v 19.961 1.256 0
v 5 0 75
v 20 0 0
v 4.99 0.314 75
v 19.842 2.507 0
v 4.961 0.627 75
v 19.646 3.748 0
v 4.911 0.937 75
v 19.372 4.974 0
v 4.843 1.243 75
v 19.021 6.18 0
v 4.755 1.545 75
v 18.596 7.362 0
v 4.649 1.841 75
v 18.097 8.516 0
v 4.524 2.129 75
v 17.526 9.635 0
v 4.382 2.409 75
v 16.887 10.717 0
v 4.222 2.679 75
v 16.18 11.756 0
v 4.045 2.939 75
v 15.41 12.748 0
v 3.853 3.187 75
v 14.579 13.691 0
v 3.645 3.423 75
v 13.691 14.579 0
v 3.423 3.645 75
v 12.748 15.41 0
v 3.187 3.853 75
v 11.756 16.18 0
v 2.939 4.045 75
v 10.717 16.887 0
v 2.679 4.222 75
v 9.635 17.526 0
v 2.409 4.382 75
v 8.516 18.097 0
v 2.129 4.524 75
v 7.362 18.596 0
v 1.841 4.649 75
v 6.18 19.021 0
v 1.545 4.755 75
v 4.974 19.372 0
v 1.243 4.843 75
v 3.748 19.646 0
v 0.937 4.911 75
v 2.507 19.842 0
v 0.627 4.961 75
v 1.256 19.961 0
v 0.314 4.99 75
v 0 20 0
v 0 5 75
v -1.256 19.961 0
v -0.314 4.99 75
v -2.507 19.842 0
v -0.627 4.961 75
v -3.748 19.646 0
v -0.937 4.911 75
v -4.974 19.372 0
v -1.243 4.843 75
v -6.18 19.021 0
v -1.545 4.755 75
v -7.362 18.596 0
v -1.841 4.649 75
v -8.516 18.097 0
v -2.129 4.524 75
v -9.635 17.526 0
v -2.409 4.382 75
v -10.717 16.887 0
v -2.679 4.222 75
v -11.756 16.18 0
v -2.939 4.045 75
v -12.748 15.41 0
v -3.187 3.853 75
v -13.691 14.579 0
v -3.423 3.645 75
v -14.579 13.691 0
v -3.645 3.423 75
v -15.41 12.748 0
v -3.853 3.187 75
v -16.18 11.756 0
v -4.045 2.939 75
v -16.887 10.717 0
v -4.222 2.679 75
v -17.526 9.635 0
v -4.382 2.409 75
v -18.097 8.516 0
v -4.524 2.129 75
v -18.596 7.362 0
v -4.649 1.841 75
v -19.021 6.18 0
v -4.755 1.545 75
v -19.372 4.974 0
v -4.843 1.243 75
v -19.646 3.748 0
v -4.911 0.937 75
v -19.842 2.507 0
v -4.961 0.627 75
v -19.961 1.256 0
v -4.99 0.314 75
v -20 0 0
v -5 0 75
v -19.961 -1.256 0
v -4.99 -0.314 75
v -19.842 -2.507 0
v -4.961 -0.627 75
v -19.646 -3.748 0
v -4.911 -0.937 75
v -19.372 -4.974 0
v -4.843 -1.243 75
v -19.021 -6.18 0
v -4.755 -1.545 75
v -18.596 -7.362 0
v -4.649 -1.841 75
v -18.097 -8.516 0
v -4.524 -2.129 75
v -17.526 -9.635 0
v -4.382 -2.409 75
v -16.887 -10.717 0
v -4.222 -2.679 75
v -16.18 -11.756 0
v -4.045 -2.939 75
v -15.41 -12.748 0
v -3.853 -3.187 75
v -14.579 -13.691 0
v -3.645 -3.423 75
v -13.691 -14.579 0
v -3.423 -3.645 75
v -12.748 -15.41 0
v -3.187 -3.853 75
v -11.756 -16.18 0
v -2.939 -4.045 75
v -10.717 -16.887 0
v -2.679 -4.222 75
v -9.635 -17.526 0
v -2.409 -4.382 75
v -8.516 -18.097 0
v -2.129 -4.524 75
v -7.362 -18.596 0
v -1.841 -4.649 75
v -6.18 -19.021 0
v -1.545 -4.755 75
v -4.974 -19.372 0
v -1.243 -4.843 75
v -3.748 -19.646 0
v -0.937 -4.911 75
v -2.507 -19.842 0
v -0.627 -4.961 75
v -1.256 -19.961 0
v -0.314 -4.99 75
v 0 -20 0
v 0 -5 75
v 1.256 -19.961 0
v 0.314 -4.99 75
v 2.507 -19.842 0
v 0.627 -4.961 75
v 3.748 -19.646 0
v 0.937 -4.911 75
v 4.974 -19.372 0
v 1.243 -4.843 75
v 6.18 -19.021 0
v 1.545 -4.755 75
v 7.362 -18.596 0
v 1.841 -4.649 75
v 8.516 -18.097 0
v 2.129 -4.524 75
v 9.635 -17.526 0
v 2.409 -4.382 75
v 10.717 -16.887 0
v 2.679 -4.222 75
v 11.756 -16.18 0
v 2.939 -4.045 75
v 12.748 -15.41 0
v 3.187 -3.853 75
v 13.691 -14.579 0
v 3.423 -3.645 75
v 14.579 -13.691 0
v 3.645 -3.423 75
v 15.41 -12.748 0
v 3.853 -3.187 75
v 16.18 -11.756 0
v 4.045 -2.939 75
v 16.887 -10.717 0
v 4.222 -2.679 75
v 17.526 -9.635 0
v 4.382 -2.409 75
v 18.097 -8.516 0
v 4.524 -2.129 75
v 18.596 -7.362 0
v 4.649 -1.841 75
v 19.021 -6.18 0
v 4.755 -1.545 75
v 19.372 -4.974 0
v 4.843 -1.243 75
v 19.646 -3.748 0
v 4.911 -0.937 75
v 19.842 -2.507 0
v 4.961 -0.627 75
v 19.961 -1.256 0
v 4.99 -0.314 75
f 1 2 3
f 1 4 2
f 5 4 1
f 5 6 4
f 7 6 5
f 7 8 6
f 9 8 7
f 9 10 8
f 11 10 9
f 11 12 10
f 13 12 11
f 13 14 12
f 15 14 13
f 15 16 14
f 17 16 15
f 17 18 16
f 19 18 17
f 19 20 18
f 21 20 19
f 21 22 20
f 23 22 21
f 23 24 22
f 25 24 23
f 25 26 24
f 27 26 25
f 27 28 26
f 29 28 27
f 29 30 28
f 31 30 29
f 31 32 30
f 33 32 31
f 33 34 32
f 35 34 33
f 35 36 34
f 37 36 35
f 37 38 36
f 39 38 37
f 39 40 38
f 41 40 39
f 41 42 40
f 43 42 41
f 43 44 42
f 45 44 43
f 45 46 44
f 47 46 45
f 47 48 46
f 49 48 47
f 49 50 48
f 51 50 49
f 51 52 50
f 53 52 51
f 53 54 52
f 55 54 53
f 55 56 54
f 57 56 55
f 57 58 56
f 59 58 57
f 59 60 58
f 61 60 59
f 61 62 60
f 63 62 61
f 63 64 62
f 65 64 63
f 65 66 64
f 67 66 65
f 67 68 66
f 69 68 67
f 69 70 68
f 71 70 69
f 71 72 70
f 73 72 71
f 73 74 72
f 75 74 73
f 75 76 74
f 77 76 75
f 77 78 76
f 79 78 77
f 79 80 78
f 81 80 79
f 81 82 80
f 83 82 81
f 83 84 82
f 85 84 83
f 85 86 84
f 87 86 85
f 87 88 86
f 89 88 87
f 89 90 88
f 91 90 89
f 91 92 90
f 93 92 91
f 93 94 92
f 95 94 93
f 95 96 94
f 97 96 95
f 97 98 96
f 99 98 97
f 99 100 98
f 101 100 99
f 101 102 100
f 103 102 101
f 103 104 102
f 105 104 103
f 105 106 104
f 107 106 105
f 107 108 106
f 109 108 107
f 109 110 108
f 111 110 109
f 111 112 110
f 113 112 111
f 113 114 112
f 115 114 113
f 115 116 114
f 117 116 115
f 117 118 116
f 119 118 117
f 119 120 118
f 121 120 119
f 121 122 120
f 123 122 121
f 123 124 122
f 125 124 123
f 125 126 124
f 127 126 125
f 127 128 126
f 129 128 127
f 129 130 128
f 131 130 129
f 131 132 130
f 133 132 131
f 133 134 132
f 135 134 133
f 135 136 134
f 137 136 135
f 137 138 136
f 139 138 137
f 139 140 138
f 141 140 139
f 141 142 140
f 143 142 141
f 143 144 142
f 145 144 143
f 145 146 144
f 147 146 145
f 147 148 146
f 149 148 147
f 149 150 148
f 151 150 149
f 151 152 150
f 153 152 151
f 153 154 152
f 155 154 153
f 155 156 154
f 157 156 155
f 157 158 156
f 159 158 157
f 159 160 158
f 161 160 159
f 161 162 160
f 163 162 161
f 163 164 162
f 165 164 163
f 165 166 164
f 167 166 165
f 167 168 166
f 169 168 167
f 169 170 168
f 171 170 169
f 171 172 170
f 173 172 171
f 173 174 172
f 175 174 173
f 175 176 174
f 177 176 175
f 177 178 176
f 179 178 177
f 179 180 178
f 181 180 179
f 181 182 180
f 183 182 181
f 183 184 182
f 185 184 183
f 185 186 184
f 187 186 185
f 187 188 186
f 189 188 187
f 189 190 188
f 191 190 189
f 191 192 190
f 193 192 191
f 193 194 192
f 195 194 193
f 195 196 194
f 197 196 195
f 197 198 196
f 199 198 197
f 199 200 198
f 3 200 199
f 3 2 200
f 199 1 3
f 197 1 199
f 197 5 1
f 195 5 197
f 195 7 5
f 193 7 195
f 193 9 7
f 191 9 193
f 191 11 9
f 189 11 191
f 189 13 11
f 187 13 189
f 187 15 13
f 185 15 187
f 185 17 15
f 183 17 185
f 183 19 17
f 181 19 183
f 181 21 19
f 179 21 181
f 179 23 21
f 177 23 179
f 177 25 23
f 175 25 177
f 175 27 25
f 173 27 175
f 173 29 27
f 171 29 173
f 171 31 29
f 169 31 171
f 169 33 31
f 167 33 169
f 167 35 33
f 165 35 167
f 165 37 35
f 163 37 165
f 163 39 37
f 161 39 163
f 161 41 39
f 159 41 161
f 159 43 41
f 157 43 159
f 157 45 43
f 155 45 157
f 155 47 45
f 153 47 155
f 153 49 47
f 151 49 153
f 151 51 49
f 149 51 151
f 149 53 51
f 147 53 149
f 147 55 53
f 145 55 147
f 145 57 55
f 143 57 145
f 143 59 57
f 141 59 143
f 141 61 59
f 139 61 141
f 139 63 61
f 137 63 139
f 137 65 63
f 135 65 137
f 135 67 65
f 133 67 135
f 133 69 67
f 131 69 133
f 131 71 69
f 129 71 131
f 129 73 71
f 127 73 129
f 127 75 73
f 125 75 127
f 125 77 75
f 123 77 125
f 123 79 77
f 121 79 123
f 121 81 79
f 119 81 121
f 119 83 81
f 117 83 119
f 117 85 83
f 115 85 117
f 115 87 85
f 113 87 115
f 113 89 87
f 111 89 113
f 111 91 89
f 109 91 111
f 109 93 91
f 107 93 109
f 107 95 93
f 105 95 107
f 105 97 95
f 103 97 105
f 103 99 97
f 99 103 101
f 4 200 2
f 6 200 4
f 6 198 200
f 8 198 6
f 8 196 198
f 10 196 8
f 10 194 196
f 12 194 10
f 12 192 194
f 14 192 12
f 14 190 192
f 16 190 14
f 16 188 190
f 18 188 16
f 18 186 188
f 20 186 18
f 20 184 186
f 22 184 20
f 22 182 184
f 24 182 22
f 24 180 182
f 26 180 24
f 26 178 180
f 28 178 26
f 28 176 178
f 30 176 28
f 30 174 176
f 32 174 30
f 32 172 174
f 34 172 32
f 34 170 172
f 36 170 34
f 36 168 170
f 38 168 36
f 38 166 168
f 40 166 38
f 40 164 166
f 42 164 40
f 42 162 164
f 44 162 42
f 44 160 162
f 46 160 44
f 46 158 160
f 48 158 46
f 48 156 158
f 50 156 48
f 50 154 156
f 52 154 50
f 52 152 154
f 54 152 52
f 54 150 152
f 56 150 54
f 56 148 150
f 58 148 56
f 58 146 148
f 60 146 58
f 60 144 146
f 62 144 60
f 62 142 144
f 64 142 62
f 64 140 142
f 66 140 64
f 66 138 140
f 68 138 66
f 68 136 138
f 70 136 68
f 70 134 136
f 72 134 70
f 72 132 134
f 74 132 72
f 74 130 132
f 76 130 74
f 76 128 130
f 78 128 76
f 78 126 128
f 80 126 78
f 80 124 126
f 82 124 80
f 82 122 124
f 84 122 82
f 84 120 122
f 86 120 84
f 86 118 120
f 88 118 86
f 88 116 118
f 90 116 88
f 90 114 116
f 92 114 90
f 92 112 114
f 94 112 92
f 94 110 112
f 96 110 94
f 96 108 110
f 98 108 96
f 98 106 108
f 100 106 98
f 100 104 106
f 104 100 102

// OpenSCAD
//Enter height of cone.
height =75; // [10:150]


//Enter the first radius.
radius =20; // [5:75]

//Enter the second radius.
radius2 =5; // [0:75]


cylinder ( h=height, r1=radius, r2=radius2, $fn=100 ) ;
 
